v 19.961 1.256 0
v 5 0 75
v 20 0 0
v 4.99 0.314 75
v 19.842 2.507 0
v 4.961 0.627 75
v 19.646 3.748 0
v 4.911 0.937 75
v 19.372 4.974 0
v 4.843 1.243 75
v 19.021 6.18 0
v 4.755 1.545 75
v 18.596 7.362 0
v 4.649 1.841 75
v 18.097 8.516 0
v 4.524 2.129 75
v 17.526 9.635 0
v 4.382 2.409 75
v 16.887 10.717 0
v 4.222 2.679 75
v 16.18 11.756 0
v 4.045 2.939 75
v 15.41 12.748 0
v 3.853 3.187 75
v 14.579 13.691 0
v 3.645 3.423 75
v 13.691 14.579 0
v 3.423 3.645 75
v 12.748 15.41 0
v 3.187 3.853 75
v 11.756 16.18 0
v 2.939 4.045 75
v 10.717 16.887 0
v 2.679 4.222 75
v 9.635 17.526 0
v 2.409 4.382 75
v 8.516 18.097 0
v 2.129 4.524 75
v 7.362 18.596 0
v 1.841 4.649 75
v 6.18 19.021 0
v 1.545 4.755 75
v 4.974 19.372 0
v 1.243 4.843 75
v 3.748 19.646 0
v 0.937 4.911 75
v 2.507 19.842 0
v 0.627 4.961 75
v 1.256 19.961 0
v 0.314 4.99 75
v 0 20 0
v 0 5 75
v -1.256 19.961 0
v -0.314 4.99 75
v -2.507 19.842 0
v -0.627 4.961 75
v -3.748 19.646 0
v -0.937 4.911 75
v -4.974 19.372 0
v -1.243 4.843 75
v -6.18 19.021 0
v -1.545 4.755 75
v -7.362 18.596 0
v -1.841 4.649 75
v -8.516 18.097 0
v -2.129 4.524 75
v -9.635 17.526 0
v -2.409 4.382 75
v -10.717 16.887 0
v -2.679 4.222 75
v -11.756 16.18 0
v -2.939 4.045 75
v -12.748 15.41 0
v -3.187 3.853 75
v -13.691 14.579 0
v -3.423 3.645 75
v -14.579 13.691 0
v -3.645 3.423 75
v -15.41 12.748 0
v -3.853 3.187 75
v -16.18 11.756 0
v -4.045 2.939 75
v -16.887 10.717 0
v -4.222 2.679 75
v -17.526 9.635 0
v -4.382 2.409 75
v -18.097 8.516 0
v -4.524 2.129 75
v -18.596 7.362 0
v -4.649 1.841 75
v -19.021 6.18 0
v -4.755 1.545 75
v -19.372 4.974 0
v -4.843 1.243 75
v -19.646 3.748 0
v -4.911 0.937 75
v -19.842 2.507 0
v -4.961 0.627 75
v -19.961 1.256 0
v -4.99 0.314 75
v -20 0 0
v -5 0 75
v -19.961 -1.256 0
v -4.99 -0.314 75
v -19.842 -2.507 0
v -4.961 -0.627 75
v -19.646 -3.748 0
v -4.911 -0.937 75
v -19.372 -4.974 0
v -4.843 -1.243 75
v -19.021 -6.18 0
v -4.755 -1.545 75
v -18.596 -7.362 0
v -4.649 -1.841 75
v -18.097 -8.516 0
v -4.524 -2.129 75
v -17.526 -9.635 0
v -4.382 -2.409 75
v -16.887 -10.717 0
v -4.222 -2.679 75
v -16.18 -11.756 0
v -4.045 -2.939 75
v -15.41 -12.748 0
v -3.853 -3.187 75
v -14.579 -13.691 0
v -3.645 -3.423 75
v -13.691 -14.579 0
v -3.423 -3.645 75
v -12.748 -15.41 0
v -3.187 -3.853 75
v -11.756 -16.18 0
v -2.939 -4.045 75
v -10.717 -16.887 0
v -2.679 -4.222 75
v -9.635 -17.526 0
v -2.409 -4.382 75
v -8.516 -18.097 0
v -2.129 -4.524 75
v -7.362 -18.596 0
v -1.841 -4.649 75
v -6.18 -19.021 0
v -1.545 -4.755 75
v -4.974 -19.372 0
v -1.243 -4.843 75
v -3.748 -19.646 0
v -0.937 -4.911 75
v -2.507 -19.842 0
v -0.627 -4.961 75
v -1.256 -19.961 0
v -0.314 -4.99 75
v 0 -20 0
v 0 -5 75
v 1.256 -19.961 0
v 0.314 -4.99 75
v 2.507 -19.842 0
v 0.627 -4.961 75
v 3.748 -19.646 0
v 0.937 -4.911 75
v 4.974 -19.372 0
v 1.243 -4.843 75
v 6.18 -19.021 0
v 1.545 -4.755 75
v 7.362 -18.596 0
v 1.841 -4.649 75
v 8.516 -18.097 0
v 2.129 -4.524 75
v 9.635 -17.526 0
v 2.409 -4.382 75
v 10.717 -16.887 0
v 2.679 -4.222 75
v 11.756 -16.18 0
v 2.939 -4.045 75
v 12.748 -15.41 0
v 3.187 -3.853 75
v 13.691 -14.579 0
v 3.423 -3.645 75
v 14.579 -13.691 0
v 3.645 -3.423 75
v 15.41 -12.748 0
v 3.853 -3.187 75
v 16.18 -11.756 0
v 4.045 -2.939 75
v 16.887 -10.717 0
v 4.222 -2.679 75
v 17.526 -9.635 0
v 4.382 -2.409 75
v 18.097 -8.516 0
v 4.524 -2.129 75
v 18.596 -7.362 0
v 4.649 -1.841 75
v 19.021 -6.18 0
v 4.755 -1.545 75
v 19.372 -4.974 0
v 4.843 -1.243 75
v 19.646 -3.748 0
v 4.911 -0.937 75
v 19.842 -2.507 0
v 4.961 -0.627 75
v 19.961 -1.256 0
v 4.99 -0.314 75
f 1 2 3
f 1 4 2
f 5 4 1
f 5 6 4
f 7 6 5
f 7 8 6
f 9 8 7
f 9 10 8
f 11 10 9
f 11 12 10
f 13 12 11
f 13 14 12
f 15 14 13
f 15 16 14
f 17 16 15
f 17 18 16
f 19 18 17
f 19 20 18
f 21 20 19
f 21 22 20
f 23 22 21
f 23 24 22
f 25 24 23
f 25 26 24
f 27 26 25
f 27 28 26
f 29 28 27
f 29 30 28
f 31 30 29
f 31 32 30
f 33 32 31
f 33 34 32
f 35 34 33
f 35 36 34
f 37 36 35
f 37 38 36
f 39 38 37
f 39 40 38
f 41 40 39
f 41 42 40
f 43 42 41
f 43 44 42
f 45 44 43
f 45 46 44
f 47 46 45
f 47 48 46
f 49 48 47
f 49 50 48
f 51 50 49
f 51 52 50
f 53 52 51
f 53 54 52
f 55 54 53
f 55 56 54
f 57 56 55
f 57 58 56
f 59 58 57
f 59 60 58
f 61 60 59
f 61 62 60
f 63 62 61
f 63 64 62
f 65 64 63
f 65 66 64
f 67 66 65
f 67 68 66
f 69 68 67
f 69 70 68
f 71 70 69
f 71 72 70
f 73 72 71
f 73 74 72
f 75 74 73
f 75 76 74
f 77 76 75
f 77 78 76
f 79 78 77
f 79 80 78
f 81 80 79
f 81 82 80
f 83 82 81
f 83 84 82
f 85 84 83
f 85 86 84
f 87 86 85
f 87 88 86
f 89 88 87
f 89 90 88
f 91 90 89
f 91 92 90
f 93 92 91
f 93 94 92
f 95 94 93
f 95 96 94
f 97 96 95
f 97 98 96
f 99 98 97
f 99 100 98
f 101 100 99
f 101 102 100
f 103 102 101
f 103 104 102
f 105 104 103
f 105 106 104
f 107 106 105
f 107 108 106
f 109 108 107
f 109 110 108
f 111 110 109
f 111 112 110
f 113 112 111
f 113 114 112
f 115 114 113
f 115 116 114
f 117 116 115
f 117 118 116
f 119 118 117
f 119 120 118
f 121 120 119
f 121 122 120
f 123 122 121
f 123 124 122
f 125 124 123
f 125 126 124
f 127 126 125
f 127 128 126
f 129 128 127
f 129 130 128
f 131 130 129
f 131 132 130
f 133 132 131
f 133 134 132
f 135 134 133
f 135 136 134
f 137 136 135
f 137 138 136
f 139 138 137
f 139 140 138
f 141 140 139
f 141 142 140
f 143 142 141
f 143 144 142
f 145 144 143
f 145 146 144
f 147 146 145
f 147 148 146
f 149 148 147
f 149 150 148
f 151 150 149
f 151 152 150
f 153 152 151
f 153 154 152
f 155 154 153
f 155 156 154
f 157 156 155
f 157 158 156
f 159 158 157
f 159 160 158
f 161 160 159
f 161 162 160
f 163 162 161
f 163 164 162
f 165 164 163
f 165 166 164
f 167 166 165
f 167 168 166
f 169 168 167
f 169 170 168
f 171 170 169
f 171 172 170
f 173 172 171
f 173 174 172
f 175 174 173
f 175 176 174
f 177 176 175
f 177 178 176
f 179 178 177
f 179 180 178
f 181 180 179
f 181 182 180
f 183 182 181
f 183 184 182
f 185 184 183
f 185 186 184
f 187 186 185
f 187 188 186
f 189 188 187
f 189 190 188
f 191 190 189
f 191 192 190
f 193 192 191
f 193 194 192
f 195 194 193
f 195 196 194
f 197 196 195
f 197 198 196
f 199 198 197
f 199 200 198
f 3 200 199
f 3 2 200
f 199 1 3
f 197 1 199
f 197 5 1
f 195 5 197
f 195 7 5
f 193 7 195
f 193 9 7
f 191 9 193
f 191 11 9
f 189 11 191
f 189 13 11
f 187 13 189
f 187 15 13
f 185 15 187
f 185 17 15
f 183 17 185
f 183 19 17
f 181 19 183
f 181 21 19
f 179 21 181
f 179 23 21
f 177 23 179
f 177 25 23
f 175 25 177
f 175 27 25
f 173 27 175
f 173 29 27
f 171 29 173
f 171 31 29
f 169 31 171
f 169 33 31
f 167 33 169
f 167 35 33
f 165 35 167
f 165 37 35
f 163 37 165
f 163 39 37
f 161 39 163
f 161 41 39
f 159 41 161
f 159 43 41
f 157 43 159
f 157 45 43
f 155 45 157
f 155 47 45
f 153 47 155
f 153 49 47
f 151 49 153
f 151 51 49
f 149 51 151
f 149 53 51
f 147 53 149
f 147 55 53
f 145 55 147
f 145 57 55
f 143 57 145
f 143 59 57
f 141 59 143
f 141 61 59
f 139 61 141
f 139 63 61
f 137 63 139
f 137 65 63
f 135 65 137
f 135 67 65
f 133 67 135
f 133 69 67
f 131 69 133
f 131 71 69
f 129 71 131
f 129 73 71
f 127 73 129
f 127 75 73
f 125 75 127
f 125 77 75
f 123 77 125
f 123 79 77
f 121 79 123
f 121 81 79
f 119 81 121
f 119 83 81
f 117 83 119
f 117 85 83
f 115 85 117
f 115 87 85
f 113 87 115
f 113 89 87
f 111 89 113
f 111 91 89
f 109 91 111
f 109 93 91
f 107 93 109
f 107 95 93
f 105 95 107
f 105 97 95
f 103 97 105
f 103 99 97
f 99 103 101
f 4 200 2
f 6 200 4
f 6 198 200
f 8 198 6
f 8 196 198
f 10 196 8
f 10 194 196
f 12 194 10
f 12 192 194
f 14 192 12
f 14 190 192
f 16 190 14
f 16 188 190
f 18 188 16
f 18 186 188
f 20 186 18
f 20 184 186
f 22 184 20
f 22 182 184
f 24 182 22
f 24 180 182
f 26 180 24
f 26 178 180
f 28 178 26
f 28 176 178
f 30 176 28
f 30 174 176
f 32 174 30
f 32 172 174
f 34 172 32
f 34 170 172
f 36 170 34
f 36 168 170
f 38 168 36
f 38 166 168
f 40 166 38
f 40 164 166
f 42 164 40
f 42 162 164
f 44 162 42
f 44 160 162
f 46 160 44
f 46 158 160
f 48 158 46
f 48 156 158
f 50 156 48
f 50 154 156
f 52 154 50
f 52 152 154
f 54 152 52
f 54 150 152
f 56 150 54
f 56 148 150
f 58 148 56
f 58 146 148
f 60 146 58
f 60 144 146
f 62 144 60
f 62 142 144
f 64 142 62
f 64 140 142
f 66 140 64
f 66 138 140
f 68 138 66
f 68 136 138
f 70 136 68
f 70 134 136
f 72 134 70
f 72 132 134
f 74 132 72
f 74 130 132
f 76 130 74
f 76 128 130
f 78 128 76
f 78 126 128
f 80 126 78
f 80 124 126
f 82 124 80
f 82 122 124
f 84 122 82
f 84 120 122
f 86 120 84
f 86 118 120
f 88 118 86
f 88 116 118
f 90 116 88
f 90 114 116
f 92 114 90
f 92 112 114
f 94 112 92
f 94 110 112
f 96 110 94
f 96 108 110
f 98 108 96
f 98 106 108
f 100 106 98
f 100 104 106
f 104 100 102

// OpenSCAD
//Enter height of cone.
height =75; // [10:150]


//Enter the first radius.
radius =20; // [5:75]

//Enter the second radius.
radius2 =5; // [0:75]


cylinder ( h=height, r1=radius, r2=radius2, $fn=100 ) ;
 
